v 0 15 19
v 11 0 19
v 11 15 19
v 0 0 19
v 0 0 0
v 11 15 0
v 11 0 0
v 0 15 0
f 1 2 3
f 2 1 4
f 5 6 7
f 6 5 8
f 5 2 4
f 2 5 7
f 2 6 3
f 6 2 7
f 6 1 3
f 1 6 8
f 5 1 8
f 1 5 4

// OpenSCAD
// Generated by SolidPython 1.0.1 on 2020-07-29 00:46:55


cube(size = [11, 15, 19]);
/***********************************************
*********      SolidPython code:      **********
************************************************
 
# import packages: SolidPython
from solid import *
from solid.utils import *
from itertools import chain, combinations, permutations


class Resize:

    def __init__(self, scad_file):
        self.scad_file = scad_file
        #self.scad_file = import_scad(scad_file)
        # cone/cylinder param:
        self.r1 = 0
        self.r2 = 0
        self.h = 0
        # rectangular prism param:
        self.w = 0
        self.l = 0
        # ellipse param:
        self.r = 0

    # import OpenScad code (file name corresponds to shape)


    # classify shape + parameters
    def assign(self, param1, param2, param3):
        if self.scad_file == 'cone.scad':
            self.r1 = param1
            self.r2 = param2
            self.h = param3
        elif self.scad_file == 'cylinder.scad':
            self.r1 = param1
            self.r2 = param2
            self.h = param3
        elif self.scad_file == 'rectangularPrism.scad':
            self.h = param1
            self.l = param2
            self.w = param3
        else:
            self.r = param1
            self.h = param2

    # resize parameters
    def iterate(self):
        x = range(3, 20, 2)
        i = 1
        if self.scad_file == 'cone.scad':
            tempList = list(permutations(x, 2))
            for temp in tempList:
                param1 = temp[0]
                param2 = temp[1]
                filepath = 'produced_scad_files/' + 'cone' + str(param1) + '_' + str(param2) + '_' + '.scad'
                scad_render_to_file(cylinder(h=param1, r1=param2, r2=0), filepath)

        elif self.scad_file == 'cylinder.scad':
            tempList = list(permutations(x, 3))
            for temp in tempList:
                param1 = temp[0]
                param2 = temp[1]
                filepath = 'produced_scad_files/' + 'cylinder' + str(param1) + '_' + str(param2) + '_' + '.scad'
                scad_render_to_file(cylinder(h=param1, r1=param2, r2=param2), filepath)

        elif self.scad_file == 'rectangularPrism.scad':
            tempList = list(permutations(x, 3))
            for temp in tempList:
                param1 = temp[0]
                param2 = temp[1]
                param3 = temp[2]
                filepath = 'produced_scad_files/' + 'rectangularPrism' + str(param1) + '_' + str(param2) + '_' + str(
                    param3) + '.scad'
                scad_render_to_file(cube(size=(param1, param2, param3)), filepath)

        elif self.scad_file == 'ellipse.scad':
            tempList = list(permutations(x, 4))
            for temp in tempList:
                param1 = temp[0]
                param2 = temp[1]
                param3 = temp[2]
                param4 = temp[3]
                filepath = 'produced_scad_files/' + 'ellipse' + str(param1) + '_' + str(param2) + '_' + str(param3) + '_' + str(param4) + '.scad'
                scad_render_to_file(scale([param1, param2, param3])(sphere(r=param4)), filepath)

    def render_to_scadfile(self):
        scad_render_to_file(scad, 'example.scad') 
 
************************************************/
